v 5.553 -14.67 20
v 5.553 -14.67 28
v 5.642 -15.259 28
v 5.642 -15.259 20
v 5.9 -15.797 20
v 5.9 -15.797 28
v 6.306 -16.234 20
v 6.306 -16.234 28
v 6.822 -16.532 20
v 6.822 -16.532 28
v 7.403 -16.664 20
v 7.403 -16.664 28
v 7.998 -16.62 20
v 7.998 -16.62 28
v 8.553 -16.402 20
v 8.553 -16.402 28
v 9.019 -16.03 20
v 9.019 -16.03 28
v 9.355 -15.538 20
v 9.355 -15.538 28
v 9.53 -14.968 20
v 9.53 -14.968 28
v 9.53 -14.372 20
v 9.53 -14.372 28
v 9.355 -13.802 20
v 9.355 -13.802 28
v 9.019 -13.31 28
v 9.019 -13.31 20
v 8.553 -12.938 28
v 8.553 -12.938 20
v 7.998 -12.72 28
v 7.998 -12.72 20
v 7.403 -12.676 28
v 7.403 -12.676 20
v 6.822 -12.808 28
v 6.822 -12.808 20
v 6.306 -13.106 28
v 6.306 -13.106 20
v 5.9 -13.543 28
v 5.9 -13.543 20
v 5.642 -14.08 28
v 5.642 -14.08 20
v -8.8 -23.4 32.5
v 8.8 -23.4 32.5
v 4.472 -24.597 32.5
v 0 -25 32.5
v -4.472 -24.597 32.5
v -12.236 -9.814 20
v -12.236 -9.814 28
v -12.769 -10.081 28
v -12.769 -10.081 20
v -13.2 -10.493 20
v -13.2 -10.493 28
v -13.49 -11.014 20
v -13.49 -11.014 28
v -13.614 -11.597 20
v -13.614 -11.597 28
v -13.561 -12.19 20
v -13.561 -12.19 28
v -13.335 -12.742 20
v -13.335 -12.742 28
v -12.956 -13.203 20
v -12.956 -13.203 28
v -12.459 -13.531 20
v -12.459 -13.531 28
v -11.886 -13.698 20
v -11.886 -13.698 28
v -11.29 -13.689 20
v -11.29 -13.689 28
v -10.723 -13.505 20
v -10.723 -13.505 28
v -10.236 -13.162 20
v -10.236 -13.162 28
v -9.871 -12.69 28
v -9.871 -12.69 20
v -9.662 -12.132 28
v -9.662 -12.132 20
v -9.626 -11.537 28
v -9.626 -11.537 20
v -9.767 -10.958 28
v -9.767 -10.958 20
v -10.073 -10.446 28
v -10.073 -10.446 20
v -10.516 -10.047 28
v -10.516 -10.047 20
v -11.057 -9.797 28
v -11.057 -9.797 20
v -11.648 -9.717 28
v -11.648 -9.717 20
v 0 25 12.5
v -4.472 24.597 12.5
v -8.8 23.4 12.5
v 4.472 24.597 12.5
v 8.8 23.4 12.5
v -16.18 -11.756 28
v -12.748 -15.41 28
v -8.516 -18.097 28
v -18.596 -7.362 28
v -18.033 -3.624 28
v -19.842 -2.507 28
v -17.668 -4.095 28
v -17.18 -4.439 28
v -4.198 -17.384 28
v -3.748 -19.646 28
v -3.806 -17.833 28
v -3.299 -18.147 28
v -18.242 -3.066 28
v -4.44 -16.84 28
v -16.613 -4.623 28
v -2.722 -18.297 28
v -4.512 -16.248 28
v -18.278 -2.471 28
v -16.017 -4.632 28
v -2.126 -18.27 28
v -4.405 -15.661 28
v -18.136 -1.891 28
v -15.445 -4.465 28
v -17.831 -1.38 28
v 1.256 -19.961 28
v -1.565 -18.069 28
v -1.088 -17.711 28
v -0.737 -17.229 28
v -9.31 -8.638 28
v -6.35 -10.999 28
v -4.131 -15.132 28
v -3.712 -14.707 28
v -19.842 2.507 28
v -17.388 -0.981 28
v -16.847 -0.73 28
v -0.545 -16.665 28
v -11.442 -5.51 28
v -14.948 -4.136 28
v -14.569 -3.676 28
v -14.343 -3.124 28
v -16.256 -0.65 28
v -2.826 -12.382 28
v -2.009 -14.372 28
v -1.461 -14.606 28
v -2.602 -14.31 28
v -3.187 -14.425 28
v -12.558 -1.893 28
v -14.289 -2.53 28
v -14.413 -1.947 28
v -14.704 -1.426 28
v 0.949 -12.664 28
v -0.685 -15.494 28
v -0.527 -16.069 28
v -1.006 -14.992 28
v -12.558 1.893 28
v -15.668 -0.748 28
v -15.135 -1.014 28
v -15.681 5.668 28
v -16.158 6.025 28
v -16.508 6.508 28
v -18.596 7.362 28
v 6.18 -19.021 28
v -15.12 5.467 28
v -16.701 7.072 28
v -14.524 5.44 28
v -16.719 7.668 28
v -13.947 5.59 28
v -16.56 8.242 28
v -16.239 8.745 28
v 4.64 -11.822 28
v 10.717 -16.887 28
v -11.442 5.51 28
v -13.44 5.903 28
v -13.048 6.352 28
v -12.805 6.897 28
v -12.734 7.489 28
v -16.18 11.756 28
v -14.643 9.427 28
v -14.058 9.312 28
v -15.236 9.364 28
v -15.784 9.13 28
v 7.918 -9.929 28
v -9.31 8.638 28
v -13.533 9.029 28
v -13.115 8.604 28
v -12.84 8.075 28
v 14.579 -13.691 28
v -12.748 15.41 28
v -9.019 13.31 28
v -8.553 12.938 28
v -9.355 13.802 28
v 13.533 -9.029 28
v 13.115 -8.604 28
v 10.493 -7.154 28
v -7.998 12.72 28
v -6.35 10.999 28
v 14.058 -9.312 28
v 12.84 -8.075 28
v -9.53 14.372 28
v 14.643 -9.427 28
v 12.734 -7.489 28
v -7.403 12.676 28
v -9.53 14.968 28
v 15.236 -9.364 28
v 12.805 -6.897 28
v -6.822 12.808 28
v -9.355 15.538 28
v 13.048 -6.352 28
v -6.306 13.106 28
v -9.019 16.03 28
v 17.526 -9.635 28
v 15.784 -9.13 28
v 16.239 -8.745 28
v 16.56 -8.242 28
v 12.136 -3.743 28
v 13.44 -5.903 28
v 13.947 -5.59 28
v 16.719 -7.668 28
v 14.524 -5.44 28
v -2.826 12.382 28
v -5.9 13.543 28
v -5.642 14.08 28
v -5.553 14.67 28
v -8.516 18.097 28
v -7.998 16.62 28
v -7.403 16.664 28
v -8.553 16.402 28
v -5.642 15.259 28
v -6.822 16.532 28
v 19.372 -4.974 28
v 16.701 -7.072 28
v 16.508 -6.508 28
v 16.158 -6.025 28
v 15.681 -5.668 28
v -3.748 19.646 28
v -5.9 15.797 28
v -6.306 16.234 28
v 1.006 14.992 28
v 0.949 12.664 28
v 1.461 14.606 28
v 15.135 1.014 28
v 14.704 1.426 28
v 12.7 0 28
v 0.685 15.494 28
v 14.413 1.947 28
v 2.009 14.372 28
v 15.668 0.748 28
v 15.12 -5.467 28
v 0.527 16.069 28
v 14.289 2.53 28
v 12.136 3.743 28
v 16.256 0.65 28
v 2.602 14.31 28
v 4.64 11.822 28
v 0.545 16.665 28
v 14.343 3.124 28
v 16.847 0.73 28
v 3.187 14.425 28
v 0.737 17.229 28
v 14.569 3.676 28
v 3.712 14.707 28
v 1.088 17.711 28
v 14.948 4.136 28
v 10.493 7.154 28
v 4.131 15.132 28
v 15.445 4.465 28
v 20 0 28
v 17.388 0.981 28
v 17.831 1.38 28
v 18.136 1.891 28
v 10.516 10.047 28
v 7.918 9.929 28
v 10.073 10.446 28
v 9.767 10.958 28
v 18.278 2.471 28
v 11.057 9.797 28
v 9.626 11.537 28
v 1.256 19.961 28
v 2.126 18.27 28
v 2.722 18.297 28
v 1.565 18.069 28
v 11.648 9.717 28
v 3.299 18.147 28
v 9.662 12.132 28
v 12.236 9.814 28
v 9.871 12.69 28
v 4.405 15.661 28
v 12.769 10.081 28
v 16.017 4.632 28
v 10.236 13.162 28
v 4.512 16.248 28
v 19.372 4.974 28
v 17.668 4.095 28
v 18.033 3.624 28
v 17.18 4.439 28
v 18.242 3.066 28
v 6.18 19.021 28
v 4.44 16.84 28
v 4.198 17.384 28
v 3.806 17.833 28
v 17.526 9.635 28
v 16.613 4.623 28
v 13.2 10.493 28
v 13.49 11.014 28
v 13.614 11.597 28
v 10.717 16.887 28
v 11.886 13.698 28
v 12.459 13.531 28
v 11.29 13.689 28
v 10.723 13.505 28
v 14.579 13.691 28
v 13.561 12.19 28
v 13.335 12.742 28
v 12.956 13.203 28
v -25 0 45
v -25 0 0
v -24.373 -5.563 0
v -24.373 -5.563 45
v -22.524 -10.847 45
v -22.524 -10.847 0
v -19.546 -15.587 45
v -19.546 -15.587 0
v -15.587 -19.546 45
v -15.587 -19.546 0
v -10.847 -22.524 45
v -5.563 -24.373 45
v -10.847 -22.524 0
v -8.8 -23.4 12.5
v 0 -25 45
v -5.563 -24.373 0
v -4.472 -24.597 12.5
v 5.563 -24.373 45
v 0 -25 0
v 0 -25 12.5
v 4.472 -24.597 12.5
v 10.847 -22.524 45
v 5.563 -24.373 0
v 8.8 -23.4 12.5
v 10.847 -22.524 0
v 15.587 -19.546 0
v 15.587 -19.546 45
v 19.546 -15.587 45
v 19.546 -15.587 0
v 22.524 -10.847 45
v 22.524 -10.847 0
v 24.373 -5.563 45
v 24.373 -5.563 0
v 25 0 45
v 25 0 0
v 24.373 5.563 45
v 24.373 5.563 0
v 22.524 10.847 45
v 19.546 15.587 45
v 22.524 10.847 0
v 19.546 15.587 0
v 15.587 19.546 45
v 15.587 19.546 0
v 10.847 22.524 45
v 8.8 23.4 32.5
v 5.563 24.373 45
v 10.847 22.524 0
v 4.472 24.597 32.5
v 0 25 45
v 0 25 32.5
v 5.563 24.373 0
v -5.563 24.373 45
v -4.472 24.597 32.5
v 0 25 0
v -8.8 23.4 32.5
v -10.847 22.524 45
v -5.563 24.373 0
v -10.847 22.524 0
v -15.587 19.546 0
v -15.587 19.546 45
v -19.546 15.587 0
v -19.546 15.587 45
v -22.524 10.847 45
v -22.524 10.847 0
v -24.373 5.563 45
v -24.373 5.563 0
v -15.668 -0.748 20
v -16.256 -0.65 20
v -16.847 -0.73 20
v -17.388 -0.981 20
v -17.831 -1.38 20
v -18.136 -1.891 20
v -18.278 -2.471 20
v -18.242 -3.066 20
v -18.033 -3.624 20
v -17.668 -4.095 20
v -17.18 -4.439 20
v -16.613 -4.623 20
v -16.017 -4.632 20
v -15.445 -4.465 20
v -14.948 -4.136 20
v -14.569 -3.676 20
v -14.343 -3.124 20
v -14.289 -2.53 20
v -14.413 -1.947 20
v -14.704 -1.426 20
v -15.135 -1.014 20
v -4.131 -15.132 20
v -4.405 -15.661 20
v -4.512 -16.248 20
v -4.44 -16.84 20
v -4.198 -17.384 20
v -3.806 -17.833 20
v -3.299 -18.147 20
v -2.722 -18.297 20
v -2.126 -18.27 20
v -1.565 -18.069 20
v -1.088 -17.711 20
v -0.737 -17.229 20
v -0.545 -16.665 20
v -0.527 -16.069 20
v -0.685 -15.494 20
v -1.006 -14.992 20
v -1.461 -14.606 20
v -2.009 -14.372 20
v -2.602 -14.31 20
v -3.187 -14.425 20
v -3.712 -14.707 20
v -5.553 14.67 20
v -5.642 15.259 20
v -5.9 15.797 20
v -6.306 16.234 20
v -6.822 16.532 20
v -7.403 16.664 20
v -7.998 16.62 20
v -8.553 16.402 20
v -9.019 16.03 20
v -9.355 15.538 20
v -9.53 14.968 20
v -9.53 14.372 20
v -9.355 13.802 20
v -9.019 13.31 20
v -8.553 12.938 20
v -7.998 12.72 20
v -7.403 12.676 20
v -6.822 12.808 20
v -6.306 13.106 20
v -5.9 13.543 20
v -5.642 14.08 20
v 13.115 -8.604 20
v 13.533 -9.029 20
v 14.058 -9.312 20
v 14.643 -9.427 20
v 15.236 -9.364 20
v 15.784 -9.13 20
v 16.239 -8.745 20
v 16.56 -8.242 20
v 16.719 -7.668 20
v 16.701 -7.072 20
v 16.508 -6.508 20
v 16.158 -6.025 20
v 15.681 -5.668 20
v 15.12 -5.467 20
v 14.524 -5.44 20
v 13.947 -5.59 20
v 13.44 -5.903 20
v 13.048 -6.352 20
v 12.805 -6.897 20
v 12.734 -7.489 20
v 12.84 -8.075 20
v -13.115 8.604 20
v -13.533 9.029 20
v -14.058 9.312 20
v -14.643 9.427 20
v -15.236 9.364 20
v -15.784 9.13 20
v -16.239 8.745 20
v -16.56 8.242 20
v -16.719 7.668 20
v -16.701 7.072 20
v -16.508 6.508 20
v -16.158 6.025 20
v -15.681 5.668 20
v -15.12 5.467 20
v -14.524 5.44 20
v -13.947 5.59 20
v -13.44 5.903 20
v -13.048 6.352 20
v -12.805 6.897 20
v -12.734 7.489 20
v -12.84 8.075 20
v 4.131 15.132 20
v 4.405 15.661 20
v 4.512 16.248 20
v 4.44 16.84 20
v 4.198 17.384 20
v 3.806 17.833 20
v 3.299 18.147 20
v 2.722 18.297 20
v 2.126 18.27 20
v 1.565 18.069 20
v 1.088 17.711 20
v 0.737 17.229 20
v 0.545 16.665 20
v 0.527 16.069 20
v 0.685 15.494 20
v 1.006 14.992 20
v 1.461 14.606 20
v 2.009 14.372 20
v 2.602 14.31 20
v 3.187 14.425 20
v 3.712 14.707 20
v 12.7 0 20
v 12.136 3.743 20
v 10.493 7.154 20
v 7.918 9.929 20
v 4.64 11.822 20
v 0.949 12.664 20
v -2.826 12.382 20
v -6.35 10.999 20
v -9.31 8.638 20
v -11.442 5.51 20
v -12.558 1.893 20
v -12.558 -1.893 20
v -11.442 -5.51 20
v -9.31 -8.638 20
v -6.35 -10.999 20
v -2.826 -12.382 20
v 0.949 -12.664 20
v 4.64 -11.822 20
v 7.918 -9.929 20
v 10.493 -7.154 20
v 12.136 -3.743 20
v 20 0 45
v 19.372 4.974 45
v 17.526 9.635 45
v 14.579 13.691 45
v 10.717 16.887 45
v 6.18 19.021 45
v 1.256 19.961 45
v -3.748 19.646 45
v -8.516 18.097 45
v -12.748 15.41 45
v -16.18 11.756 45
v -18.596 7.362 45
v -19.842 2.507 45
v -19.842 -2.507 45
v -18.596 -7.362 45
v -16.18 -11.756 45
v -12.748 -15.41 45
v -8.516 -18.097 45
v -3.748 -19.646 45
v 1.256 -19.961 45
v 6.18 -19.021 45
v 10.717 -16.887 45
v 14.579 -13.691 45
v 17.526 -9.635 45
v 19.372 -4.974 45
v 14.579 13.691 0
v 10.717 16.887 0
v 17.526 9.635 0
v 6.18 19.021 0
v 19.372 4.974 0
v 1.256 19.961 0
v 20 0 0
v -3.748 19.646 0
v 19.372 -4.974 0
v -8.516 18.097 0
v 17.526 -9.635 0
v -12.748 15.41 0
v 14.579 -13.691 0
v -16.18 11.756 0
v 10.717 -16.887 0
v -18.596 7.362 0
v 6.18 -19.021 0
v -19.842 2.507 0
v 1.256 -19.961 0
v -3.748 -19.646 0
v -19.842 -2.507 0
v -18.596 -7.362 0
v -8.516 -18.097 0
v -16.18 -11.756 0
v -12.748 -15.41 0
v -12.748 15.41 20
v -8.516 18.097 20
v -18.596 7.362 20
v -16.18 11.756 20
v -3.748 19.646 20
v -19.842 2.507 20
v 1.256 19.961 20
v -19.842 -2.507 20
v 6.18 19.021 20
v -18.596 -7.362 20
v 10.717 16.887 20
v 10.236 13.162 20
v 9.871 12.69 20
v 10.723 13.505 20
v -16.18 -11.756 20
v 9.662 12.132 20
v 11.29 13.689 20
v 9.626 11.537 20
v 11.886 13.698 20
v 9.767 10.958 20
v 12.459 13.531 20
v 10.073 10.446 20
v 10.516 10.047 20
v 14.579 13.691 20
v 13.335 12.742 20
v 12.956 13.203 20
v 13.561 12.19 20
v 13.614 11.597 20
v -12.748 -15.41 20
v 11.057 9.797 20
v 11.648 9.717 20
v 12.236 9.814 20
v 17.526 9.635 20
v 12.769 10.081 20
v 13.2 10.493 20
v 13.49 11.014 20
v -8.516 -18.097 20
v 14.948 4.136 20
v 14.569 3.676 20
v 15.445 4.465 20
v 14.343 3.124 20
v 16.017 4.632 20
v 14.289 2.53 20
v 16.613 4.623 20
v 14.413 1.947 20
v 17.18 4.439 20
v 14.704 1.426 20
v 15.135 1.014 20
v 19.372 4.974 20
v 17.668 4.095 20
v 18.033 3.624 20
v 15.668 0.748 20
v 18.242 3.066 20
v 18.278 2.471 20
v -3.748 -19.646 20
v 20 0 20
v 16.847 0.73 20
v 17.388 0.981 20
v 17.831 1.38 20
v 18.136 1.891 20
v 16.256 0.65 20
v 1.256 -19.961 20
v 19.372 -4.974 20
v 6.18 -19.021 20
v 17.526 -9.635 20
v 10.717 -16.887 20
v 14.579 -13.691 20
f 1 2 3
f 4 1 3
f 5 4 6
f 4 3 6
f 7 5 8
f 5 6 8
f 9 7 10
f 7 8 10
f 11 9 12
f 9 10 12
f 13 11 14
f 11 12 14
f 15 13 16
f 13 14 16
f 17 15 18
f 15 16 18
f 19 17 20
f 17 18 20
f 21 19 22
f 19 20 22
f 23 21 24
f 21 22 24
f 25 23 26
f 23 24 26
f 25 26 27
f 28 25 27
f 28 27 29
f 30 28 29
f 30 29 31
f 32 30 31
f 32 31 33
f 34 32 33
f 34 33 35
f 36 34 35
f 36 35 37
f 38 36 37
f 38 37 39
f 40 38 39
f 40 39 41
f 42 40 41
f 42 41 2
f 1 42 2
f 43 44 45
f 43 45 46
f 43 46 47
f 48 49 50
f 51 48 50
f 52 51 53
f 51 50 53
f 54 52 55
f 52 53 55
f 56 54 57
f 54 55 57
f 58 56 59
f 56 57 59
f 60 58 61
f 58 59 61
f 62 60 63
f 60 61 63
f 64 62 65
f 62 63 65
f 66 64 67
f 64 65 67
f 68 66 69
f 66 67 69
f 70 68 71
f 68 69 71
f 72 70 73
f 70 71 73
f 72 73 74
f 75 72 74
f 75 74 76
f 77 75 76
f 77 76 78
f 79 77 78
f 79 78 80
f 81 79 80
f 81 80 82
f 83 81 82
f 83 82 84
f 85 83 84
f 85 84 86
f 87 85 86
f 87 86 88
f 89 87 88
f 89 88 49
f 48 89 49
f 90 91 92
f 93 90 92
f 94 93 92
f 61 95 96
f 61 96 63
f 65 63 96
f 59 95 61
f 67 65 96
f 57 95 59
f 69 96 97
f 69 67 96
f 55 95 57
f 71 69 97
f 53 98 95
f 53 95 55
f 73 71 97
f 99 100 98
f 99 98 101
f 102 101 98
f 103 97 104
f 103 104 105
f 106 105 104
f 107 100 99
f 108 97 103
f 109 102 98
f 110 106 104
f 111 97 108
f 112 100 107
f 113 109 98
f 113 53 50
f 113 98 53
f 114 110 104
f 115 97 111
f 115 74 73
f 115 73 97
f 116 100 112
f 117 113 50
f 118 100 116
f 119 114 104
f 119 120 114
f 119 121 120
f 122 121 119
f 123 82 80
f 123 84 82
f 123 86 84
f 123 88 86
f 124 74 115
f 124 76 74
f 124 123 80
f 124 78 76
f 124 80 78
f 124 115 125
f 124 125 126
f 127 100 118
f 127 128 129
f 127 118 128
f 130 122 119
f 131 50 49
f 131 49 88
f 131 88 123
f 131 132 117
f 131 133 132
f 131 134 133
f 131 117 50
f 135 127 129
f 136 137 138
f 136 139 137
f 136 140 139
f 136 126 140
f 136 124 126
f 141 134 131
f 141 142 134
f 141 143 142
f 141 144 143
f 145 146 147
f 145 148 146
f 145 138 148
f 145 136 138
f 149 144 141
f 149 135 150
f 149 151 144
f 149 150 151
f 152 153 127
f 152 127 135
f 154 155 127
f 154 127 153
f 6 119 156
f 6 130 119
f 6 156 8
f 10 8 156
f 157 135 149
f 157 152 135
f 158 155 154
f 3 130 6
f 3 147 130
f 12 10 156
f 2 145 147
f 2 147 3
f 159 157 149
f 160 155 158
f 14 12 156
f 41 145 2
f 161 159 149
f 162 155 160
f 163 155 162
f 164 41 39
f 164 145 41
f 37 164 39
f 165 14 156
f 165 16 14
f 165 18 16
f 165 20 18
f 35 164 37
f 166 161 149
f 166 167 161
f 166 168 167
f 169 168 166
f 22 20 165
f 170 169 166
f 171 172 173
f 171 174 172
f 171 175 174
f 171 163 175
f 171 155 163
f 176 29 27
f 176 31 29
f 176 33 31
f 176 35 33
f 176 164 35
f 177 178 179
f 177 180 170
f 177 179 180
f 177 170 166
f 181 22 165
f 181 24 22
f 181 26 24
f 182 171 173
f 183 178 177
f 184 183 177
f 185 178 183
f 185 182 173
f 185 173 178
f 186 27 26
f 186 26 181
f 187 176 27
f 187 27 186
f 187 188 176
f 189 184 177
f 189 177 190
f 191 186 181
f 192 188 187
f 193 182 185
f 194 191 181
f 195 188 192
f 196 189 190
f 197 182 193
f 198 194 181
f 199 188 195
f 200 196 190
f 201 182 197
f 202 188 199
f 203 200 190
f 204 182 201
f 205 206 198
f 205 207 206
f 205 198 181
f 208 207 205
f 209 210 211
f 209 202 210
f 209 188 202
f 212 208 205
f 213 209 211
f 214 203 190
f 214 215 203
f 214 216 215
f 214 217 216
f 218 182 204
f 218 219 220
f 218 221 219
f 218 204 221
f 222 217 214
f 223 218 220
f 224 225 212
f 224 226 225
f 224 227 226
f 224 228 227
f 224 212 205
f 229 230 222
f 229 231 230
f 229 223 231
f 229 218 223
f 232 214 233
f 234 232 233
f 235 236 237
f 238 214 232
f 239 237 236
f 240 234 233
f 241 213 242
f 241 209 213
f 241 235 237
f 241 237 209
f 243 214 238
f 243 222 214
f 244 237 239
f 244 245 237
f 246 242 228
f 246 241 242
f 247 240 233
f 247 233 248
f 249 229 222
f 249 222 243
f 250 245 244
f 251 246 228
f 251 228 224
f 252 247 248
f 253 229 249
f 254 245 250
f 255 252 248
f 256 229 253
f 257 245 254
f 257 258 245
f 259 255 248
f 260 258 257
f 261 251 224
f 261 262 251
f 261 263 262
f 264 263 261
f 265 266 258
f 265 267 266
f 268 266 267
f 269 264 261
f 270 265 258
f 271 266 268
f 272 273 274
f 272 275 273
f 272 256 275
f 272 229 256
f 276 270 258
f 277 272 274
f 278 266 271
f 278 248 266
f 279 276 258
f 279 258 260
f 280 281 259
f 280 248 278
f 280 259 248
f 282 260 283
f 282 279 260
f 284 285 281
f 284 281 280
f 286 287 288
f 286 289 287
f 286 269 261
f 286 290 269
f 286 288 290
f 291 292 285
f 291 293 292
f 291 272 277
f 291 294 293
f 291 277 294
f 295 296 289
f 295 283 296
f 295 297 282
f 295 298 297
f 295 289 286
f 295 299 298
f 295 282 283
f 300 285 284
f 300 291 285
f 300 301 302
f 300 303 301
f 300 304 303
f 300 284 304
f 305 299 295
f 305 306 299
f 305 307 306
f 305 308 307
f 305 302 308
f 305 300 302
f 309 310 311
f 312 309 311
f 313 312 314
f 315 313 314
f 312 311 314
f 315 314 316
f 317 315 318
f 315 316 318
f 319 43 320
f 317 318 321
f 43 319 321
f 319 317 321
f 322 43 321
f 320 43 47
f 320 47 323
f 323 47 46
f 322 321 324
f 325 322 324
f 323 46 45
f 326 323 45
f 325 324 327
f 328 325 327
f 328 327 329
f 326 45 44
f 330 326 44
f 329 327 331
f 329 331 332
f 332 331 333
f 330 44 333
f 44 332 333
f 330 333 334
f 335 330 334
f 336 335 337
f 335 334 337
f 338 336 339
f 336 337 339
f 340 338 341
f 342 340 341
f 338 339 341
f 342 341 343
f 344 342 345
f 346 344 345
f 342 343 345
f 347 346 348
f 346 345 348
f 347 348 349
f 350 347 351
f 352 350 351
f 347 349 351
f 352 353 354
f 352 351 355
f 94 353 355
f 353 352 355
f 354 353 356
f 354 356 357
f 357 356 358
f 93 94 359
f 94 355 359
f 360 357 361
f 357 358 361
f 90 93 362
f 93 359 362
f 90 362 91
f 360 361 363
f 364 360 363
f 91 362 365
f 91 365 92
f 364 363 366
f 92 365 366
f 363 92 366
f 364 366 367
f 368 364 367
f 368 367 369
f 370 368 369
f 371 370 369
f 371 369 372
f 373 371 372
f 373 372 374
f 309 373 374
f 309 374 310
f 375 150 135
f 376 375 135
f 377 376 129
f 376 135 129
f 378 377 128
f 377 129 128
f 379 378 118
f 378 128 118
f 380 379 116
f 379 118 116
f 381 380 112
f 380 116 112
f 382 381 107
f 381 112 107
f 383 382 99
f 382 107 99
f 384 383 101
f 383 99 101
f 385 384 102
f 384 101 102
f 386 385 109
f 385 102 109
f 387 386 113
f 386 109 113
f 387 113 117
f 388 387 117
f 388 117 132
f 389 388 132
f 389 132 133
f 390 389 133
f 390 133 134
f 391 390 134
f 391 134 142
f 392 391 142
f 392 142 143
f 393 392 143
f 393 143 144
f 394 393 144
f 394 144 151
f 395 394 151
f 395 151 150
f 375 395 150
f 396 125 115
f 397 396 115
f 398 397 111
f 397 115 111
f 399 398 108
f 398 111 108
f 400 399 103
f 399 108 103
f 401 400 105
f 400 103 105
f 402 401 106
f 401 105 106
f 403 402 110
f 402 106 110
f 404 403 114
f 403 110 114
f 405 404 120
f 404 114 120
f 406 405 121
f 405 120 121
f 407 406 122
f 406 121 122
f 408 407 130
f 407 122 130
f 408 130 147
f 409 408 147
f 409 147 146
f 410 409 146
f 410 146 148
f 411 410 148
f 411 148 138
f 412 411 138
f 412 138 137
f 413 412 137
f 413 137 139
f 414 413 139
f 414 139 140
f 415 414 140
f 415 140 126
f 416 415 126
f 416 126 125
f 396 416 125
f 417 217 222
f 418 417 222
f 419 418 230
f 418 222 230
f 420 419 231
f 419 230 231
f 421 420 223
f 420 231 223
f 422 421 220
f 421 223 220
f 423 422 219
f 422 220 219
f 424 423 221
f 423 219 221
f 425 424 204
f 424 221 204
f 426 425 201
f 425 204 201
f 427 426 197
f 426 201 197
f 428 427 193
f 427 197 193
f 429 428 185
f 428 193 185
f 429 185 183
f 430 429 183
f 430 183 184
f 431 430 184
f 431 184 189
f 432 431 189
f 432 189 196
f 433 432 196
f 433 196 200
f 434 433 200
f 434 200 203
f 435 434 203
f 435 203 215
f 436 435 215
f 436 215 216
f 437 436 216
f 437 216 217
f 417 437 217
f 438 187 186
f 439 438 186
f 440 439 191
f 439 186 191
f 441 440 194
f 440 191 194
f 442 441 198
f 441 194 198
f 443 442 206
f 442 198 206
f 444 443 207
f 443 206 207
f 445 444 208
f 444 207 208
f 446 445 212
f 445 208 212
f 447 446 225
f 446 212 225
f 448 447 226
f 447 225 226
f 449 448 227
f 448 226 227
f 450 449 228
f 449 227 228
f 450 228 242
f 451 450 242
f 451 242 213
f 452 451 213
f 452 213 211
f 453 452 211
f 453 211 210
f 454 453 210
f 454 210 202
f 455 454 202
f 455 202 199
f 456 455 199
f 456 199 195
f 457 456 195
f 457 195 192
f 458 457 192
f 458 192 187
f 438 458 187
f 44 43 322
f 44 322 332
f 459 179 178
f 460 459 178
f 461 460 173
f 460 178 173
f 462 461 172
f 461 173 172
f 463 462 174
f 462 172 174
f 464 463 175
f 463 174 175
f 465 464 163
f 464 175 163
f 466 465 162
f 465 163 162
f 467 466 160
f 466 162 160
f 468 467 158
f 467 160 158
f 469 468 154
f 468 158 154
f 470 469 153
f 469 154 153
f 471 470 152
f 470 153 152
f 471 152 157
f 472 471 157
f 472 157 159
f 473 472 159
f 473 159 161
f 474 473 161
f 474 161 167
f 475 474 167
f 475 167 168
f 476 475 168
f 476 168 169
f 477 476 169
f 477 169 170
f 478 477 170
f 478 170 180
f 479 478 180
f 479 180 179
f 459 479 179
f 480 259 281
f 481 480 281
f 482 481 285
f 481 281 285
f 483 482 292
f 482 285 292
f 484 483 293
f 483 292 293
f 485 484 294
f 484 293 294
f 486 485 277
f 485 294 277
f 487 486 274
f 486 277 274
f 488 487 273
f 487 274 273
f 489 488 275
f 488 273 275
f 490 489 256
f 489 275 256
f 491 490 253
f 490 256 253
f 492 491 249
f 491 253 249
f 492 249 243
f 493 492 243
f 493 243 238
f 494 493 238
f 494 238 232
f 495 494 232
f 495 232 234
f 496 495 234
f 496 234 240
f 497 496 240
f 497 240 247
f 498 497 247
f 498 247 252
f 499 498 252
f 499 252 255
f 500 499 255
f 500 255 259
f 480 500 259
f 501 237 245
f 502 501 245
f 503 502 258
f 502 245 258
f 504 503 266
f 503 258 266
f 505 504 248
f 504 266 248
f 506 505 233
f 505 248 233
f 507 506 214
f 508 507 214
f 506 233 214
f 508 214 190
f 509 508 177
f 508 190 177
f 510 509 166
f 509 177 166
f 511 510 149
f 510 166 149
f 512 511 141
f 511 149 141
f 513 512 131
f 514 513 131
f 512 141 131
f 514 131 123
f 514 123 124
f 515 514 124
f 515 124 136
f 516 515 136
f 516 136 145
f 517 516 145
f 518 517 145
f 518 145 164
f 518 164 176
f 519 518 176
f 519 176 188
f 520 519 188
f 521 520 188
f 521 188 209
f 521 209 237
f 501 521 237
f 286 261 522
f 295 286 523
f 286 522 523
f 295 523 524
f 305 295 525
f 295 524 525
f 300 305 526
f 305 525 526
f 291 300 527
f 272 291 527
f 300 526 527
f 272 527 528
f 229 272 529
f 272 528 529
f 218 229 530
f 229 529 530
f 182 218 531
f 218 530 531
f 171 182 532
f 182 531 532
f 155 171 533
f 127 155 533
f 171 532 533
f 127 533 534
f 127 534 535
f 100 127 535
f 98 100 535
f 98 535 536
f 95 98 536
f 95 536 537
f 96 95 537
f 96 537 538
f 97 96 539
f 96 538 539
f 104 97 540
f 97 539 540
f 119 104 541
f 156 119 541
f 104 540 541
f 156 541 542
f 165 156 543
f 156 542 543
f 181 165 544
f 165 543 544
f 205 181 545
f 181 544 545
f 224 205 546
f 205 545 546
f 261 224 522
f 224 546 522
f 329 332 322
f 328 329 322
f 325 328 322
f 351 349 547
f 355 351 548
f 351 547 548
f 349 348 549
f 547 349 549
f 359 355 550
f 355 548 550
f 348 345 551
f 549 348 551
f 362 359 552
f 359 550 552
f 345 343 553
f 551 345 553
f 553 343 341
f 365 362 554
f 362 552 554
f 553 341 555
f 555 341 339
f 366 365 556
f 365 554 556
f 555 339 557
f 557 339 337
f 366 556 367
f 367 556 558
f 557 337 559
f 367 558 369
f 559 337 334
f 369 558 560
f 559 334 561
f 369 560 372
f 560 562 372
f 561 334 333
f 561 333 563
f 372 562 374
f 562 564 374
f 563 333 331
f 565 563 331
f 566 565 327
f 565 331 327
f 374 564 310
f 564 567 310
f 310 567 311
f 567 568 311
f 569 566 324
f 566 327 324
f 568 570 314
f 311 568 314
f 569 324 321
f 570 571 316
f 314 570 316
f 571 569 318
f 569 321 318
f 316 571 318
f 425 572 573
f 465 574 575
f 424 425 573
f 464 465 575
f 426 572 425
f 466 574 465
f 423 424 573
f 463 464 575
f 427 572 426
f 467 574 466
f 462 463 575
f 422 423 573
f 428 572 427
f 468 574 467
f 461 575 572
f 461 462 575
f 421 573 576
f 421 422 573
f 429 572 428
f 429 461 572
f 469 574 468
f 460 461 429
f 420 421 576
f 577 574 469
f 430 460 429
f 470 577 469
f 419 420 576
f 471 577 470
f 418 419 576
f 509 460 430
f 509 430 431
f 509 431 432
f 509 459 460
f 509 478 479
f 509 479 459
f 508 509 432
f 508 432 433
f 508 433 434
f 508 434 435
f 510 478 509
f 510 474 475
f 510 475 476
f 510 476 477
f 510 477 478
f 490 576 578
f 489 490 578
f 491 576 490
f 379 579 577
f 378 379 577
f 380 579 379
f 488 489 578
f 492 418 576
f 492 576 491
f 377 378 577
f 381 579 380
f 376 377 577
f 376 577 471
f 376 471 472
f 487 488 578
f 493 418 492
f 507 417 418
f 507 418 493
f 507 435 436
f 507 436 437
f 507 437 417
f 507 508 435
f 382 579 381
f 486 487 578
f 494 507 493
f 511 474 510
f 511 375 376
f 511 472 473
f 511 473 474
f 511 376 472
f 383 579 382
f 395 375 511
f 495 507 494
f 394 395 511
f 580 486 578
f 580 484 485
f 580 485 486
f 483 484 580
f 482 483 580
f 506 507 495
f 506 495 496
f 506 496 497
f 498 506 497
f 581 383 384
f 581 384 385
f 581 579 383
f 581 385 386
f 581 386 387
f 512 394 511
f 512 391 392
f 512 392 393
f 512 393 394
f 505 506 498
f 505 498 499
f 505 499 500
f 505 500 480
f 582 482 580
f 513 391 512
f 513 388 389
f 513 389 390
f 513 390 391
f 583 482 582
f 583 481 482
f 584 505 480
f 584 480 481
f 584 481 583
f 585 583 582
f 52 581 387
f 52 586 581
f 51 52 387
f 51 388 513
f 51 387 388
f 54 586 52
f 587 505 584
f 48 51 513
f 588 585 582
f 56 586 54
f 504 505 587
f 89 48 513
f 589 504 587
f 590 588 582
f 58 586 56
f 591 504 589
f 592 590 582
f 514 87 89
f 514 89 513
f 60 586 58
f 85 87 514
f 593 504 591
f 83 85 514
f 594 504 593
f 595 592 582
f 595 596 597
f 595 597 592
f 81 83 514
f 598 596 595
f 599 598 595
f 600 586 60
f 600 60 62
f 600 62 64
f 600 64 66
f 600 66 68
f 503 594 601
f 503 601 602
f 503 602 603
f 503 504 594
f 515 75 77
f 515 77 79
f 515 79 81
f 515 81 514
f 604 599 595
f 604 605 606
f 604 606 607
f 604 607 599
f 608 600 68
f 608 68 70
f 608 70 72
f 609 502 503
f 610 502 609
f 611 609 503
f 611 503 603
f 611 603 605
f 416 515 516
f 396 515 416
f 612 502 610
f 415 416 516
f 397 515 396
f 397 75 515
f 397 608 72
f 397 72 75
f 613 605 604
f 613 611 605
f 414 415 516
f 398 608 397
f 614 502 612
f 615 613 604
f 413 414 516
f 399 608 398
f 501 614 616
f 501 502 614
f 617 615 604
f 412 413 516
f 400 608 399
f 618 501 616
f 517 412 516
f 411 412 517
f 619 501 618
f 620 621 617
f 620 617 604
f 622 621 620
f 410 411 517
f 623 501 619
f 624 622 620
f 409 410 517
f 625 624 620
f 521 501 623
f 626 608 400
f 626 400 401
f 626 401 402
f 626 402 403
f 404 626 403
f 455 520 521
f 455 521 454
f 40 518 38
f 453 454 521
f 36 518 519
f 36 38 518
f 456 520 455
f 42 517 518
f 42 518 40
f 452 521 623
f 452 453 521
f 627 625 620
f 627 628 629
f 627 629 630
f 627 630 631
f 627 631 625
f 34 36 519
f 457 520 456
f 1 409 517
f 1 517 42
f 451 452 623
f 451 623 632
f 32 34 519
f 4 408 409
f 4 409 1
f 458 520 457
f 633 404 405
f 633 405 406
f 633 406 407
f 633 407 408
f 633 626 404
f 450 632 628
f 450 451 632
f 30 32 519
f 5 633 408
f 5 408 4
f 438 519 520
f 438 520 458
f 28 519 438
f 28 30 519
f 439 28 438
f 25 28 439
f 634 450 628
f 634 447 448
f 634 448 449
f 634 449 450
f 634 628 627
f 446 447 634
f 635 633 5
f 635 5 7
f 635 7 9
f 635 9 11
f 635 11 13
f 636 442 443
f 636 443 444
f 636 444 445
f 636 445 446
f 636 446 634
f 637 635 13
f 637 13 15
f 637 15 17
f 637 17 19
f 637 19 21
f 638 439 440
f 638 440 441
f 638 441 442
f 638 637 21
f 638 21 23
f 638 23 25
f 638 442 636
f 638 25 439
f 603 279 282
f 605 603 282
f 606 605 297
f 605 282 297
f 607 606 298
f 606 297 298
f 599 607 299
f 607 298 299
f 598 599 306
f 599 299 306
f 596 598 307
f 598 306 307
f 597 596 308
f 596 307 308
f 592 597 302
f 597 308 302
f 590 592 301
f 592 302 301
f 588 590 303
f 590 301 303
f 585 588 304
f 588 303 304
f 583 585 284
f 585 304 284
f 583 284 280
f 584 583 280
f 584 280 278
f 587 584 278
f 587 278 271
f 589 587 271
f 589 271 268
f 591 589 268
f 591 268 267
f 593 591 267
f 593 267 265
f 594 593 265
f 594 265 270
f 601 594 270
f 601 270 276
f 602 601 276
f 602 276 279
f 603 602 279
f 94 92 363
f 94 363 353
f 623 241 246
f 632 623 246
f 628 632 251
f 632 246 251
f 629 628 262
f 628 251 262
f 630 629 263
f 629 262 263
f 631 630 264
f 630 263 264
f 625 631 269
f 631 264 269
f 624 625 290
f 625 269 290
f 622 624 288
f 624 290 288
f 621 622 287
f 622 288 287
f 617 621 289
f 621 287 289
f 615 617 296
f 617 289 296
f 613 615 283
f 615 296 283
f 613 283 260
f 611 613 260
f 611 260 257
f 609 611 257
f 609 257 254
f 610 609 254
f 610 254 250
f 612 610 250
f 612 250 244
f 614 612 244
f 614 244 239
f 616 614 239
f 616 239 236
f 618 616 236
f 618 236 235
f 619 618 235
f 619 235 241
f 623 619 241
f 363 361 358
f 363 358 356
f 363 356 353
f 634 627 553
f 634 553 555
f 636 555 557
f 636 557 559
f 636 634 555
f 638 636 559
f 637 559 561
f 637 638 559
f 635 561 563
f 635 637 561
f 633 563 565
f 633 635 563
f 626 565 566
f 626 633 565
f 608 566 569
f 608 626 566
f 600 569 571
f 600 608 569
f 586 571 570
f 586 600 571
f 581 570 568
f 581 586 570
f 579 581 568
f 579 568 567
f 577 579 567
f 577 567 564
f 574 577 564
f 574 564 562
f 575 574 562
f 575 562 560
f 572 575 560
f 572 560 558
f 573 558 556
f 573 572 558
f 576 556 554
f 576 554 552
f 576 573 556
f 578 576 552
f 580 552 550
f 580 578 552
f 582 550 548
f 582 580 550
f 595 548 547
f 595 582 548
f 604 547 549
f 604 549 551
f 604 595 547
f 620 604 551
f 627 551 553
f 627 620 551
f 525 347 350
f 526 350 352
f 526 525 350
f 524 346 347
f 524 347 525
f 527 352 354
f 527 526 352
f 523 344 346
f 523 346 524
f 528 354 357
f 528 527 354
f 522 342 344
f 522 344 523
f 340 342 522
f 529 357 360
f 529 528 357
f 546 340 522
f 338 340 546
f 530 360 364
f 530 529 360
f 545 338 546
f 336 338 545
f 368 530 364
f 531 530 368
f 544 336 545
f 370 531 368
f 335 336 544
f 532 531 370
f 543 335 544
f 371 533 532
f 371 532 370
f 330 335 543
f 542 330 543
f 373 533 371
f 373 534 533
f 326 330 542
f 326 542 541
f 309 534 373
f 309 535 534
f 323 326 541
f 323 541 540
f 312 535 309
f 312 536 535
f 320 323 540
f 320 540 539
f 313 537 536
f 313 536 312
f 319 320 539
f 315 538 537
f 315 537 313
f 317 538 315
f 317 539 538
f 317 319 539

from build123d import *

# Parameters (mm, degrees)
SKETCH1_R           = 25
BOSS_EXTRUDE1_DEPTH = 45
SKETCH2_R           = 20
CUT_EXTRUDE1_DEPTH  = 17
SKETCH3_R           = 12.7
CUT_EXTRUDE2_DEPTH  = 18
SKETCH4_R           = 2
CUT_EXTRUDE3_DEPTH  = 46.099889135
CIRPATTERN1_COUNT   = 10
CUT_EXTRUDE4_START  = -20
SKETCH5_R           = 20
CUT_EXTRUDE4_DEPTH  = 20
CUT_EXTRUDE8_DEPTH  = 10


with BuildPart() as part:
    # Sketch1 → Boss-Extrude1 (new body)
    with BuildSketch(Plane.XY):
        with Locations(Location((0, 0, 0), (0, 0, 180))):
            Circle(SKETCH1_R)
    extrude(amount=BOSS_EXTRUDE1_DEPTH)

    # Sketch2 → Cut-Extrude1 (cut)
    with BuildSketch(Plane.XY.offset(45)):
        Circle(SKETCH2_R)
    extrude(amount=-CUT_EXTRUDE1_DEPTH, mode=Mode.SUBTRACT)

    # Sketch3 → Cut-Extrude2 (cut)
    with BuildSketch(Plane.XY.offset(28)):
        Circle(SKETCH3_R)
    extrude(amount=-CUT_EXTRUDE2_DEPTH, mode=Mode.SUBTRACT)

    # Sketch4 → Cut-Extrude3 (cut, through all)
    with BuildSketch(Plane.XY.offset(28)):
        with Locations((-7.552723676, 14.669913602)):
            Circle(SKETCH4_R)
    cut_extrude3 = extrude(amount=-CUT_EXTRUDE3_DEPTH, mode=Mode.SUBTRACT)

    # CirPattern1: Cut-Extrude3 ×10 about axis
    cirpattern1_axis = Axis((0, 0, 0), (0, 0, 1))
    for i in range(1, CIRPATTERN1_COUNT):
        add(cut_extrude3.rotate(cirpattern1_axis, i * 360 / CIRPATTERN1_COUNT), mode=Mode.SUBTRACT)

    # Sketch5 → Cut-Extrude4 (cut)
    with BuildSketch(Plane(origin=(0, 0, 0), x_dir=(-1, 0, 0), z_dir=(0, 0, -1)).offset(CUT_EXTRUDE4_START)):
        with Locations(Location((0, 0, 0), (0, 0, 180))):
            Circle(SKETCH5_R)
    extrude(amount=CUT_EXTRUDE4_DEPTH, mode=Mode.SUBTRACT)

    # Sketch8 → Cut-Extrude8 (cut, symmetric)
    with BuildSketch(Plane.XY.offset(22.5)):
        with BuildLine():
            Line((-8.8, 23.4), (8.8, 23.4))
            ThreePointArc((8.8, 23.4), (0, 25), (-8.8, 23.4))
        make_face()
        with BuildLine():
            Line((-8.8, -23.4), (8.8, -23.4))
            ThreePointArc((8.8, -23.4), (0, -25), (-8.8, -23.4))
        make_face()
    extrude(amount=CUT_EXTRUDE8_DEPTH, both=True, mode=Mode.SUBTRACT)


solid = part.part
